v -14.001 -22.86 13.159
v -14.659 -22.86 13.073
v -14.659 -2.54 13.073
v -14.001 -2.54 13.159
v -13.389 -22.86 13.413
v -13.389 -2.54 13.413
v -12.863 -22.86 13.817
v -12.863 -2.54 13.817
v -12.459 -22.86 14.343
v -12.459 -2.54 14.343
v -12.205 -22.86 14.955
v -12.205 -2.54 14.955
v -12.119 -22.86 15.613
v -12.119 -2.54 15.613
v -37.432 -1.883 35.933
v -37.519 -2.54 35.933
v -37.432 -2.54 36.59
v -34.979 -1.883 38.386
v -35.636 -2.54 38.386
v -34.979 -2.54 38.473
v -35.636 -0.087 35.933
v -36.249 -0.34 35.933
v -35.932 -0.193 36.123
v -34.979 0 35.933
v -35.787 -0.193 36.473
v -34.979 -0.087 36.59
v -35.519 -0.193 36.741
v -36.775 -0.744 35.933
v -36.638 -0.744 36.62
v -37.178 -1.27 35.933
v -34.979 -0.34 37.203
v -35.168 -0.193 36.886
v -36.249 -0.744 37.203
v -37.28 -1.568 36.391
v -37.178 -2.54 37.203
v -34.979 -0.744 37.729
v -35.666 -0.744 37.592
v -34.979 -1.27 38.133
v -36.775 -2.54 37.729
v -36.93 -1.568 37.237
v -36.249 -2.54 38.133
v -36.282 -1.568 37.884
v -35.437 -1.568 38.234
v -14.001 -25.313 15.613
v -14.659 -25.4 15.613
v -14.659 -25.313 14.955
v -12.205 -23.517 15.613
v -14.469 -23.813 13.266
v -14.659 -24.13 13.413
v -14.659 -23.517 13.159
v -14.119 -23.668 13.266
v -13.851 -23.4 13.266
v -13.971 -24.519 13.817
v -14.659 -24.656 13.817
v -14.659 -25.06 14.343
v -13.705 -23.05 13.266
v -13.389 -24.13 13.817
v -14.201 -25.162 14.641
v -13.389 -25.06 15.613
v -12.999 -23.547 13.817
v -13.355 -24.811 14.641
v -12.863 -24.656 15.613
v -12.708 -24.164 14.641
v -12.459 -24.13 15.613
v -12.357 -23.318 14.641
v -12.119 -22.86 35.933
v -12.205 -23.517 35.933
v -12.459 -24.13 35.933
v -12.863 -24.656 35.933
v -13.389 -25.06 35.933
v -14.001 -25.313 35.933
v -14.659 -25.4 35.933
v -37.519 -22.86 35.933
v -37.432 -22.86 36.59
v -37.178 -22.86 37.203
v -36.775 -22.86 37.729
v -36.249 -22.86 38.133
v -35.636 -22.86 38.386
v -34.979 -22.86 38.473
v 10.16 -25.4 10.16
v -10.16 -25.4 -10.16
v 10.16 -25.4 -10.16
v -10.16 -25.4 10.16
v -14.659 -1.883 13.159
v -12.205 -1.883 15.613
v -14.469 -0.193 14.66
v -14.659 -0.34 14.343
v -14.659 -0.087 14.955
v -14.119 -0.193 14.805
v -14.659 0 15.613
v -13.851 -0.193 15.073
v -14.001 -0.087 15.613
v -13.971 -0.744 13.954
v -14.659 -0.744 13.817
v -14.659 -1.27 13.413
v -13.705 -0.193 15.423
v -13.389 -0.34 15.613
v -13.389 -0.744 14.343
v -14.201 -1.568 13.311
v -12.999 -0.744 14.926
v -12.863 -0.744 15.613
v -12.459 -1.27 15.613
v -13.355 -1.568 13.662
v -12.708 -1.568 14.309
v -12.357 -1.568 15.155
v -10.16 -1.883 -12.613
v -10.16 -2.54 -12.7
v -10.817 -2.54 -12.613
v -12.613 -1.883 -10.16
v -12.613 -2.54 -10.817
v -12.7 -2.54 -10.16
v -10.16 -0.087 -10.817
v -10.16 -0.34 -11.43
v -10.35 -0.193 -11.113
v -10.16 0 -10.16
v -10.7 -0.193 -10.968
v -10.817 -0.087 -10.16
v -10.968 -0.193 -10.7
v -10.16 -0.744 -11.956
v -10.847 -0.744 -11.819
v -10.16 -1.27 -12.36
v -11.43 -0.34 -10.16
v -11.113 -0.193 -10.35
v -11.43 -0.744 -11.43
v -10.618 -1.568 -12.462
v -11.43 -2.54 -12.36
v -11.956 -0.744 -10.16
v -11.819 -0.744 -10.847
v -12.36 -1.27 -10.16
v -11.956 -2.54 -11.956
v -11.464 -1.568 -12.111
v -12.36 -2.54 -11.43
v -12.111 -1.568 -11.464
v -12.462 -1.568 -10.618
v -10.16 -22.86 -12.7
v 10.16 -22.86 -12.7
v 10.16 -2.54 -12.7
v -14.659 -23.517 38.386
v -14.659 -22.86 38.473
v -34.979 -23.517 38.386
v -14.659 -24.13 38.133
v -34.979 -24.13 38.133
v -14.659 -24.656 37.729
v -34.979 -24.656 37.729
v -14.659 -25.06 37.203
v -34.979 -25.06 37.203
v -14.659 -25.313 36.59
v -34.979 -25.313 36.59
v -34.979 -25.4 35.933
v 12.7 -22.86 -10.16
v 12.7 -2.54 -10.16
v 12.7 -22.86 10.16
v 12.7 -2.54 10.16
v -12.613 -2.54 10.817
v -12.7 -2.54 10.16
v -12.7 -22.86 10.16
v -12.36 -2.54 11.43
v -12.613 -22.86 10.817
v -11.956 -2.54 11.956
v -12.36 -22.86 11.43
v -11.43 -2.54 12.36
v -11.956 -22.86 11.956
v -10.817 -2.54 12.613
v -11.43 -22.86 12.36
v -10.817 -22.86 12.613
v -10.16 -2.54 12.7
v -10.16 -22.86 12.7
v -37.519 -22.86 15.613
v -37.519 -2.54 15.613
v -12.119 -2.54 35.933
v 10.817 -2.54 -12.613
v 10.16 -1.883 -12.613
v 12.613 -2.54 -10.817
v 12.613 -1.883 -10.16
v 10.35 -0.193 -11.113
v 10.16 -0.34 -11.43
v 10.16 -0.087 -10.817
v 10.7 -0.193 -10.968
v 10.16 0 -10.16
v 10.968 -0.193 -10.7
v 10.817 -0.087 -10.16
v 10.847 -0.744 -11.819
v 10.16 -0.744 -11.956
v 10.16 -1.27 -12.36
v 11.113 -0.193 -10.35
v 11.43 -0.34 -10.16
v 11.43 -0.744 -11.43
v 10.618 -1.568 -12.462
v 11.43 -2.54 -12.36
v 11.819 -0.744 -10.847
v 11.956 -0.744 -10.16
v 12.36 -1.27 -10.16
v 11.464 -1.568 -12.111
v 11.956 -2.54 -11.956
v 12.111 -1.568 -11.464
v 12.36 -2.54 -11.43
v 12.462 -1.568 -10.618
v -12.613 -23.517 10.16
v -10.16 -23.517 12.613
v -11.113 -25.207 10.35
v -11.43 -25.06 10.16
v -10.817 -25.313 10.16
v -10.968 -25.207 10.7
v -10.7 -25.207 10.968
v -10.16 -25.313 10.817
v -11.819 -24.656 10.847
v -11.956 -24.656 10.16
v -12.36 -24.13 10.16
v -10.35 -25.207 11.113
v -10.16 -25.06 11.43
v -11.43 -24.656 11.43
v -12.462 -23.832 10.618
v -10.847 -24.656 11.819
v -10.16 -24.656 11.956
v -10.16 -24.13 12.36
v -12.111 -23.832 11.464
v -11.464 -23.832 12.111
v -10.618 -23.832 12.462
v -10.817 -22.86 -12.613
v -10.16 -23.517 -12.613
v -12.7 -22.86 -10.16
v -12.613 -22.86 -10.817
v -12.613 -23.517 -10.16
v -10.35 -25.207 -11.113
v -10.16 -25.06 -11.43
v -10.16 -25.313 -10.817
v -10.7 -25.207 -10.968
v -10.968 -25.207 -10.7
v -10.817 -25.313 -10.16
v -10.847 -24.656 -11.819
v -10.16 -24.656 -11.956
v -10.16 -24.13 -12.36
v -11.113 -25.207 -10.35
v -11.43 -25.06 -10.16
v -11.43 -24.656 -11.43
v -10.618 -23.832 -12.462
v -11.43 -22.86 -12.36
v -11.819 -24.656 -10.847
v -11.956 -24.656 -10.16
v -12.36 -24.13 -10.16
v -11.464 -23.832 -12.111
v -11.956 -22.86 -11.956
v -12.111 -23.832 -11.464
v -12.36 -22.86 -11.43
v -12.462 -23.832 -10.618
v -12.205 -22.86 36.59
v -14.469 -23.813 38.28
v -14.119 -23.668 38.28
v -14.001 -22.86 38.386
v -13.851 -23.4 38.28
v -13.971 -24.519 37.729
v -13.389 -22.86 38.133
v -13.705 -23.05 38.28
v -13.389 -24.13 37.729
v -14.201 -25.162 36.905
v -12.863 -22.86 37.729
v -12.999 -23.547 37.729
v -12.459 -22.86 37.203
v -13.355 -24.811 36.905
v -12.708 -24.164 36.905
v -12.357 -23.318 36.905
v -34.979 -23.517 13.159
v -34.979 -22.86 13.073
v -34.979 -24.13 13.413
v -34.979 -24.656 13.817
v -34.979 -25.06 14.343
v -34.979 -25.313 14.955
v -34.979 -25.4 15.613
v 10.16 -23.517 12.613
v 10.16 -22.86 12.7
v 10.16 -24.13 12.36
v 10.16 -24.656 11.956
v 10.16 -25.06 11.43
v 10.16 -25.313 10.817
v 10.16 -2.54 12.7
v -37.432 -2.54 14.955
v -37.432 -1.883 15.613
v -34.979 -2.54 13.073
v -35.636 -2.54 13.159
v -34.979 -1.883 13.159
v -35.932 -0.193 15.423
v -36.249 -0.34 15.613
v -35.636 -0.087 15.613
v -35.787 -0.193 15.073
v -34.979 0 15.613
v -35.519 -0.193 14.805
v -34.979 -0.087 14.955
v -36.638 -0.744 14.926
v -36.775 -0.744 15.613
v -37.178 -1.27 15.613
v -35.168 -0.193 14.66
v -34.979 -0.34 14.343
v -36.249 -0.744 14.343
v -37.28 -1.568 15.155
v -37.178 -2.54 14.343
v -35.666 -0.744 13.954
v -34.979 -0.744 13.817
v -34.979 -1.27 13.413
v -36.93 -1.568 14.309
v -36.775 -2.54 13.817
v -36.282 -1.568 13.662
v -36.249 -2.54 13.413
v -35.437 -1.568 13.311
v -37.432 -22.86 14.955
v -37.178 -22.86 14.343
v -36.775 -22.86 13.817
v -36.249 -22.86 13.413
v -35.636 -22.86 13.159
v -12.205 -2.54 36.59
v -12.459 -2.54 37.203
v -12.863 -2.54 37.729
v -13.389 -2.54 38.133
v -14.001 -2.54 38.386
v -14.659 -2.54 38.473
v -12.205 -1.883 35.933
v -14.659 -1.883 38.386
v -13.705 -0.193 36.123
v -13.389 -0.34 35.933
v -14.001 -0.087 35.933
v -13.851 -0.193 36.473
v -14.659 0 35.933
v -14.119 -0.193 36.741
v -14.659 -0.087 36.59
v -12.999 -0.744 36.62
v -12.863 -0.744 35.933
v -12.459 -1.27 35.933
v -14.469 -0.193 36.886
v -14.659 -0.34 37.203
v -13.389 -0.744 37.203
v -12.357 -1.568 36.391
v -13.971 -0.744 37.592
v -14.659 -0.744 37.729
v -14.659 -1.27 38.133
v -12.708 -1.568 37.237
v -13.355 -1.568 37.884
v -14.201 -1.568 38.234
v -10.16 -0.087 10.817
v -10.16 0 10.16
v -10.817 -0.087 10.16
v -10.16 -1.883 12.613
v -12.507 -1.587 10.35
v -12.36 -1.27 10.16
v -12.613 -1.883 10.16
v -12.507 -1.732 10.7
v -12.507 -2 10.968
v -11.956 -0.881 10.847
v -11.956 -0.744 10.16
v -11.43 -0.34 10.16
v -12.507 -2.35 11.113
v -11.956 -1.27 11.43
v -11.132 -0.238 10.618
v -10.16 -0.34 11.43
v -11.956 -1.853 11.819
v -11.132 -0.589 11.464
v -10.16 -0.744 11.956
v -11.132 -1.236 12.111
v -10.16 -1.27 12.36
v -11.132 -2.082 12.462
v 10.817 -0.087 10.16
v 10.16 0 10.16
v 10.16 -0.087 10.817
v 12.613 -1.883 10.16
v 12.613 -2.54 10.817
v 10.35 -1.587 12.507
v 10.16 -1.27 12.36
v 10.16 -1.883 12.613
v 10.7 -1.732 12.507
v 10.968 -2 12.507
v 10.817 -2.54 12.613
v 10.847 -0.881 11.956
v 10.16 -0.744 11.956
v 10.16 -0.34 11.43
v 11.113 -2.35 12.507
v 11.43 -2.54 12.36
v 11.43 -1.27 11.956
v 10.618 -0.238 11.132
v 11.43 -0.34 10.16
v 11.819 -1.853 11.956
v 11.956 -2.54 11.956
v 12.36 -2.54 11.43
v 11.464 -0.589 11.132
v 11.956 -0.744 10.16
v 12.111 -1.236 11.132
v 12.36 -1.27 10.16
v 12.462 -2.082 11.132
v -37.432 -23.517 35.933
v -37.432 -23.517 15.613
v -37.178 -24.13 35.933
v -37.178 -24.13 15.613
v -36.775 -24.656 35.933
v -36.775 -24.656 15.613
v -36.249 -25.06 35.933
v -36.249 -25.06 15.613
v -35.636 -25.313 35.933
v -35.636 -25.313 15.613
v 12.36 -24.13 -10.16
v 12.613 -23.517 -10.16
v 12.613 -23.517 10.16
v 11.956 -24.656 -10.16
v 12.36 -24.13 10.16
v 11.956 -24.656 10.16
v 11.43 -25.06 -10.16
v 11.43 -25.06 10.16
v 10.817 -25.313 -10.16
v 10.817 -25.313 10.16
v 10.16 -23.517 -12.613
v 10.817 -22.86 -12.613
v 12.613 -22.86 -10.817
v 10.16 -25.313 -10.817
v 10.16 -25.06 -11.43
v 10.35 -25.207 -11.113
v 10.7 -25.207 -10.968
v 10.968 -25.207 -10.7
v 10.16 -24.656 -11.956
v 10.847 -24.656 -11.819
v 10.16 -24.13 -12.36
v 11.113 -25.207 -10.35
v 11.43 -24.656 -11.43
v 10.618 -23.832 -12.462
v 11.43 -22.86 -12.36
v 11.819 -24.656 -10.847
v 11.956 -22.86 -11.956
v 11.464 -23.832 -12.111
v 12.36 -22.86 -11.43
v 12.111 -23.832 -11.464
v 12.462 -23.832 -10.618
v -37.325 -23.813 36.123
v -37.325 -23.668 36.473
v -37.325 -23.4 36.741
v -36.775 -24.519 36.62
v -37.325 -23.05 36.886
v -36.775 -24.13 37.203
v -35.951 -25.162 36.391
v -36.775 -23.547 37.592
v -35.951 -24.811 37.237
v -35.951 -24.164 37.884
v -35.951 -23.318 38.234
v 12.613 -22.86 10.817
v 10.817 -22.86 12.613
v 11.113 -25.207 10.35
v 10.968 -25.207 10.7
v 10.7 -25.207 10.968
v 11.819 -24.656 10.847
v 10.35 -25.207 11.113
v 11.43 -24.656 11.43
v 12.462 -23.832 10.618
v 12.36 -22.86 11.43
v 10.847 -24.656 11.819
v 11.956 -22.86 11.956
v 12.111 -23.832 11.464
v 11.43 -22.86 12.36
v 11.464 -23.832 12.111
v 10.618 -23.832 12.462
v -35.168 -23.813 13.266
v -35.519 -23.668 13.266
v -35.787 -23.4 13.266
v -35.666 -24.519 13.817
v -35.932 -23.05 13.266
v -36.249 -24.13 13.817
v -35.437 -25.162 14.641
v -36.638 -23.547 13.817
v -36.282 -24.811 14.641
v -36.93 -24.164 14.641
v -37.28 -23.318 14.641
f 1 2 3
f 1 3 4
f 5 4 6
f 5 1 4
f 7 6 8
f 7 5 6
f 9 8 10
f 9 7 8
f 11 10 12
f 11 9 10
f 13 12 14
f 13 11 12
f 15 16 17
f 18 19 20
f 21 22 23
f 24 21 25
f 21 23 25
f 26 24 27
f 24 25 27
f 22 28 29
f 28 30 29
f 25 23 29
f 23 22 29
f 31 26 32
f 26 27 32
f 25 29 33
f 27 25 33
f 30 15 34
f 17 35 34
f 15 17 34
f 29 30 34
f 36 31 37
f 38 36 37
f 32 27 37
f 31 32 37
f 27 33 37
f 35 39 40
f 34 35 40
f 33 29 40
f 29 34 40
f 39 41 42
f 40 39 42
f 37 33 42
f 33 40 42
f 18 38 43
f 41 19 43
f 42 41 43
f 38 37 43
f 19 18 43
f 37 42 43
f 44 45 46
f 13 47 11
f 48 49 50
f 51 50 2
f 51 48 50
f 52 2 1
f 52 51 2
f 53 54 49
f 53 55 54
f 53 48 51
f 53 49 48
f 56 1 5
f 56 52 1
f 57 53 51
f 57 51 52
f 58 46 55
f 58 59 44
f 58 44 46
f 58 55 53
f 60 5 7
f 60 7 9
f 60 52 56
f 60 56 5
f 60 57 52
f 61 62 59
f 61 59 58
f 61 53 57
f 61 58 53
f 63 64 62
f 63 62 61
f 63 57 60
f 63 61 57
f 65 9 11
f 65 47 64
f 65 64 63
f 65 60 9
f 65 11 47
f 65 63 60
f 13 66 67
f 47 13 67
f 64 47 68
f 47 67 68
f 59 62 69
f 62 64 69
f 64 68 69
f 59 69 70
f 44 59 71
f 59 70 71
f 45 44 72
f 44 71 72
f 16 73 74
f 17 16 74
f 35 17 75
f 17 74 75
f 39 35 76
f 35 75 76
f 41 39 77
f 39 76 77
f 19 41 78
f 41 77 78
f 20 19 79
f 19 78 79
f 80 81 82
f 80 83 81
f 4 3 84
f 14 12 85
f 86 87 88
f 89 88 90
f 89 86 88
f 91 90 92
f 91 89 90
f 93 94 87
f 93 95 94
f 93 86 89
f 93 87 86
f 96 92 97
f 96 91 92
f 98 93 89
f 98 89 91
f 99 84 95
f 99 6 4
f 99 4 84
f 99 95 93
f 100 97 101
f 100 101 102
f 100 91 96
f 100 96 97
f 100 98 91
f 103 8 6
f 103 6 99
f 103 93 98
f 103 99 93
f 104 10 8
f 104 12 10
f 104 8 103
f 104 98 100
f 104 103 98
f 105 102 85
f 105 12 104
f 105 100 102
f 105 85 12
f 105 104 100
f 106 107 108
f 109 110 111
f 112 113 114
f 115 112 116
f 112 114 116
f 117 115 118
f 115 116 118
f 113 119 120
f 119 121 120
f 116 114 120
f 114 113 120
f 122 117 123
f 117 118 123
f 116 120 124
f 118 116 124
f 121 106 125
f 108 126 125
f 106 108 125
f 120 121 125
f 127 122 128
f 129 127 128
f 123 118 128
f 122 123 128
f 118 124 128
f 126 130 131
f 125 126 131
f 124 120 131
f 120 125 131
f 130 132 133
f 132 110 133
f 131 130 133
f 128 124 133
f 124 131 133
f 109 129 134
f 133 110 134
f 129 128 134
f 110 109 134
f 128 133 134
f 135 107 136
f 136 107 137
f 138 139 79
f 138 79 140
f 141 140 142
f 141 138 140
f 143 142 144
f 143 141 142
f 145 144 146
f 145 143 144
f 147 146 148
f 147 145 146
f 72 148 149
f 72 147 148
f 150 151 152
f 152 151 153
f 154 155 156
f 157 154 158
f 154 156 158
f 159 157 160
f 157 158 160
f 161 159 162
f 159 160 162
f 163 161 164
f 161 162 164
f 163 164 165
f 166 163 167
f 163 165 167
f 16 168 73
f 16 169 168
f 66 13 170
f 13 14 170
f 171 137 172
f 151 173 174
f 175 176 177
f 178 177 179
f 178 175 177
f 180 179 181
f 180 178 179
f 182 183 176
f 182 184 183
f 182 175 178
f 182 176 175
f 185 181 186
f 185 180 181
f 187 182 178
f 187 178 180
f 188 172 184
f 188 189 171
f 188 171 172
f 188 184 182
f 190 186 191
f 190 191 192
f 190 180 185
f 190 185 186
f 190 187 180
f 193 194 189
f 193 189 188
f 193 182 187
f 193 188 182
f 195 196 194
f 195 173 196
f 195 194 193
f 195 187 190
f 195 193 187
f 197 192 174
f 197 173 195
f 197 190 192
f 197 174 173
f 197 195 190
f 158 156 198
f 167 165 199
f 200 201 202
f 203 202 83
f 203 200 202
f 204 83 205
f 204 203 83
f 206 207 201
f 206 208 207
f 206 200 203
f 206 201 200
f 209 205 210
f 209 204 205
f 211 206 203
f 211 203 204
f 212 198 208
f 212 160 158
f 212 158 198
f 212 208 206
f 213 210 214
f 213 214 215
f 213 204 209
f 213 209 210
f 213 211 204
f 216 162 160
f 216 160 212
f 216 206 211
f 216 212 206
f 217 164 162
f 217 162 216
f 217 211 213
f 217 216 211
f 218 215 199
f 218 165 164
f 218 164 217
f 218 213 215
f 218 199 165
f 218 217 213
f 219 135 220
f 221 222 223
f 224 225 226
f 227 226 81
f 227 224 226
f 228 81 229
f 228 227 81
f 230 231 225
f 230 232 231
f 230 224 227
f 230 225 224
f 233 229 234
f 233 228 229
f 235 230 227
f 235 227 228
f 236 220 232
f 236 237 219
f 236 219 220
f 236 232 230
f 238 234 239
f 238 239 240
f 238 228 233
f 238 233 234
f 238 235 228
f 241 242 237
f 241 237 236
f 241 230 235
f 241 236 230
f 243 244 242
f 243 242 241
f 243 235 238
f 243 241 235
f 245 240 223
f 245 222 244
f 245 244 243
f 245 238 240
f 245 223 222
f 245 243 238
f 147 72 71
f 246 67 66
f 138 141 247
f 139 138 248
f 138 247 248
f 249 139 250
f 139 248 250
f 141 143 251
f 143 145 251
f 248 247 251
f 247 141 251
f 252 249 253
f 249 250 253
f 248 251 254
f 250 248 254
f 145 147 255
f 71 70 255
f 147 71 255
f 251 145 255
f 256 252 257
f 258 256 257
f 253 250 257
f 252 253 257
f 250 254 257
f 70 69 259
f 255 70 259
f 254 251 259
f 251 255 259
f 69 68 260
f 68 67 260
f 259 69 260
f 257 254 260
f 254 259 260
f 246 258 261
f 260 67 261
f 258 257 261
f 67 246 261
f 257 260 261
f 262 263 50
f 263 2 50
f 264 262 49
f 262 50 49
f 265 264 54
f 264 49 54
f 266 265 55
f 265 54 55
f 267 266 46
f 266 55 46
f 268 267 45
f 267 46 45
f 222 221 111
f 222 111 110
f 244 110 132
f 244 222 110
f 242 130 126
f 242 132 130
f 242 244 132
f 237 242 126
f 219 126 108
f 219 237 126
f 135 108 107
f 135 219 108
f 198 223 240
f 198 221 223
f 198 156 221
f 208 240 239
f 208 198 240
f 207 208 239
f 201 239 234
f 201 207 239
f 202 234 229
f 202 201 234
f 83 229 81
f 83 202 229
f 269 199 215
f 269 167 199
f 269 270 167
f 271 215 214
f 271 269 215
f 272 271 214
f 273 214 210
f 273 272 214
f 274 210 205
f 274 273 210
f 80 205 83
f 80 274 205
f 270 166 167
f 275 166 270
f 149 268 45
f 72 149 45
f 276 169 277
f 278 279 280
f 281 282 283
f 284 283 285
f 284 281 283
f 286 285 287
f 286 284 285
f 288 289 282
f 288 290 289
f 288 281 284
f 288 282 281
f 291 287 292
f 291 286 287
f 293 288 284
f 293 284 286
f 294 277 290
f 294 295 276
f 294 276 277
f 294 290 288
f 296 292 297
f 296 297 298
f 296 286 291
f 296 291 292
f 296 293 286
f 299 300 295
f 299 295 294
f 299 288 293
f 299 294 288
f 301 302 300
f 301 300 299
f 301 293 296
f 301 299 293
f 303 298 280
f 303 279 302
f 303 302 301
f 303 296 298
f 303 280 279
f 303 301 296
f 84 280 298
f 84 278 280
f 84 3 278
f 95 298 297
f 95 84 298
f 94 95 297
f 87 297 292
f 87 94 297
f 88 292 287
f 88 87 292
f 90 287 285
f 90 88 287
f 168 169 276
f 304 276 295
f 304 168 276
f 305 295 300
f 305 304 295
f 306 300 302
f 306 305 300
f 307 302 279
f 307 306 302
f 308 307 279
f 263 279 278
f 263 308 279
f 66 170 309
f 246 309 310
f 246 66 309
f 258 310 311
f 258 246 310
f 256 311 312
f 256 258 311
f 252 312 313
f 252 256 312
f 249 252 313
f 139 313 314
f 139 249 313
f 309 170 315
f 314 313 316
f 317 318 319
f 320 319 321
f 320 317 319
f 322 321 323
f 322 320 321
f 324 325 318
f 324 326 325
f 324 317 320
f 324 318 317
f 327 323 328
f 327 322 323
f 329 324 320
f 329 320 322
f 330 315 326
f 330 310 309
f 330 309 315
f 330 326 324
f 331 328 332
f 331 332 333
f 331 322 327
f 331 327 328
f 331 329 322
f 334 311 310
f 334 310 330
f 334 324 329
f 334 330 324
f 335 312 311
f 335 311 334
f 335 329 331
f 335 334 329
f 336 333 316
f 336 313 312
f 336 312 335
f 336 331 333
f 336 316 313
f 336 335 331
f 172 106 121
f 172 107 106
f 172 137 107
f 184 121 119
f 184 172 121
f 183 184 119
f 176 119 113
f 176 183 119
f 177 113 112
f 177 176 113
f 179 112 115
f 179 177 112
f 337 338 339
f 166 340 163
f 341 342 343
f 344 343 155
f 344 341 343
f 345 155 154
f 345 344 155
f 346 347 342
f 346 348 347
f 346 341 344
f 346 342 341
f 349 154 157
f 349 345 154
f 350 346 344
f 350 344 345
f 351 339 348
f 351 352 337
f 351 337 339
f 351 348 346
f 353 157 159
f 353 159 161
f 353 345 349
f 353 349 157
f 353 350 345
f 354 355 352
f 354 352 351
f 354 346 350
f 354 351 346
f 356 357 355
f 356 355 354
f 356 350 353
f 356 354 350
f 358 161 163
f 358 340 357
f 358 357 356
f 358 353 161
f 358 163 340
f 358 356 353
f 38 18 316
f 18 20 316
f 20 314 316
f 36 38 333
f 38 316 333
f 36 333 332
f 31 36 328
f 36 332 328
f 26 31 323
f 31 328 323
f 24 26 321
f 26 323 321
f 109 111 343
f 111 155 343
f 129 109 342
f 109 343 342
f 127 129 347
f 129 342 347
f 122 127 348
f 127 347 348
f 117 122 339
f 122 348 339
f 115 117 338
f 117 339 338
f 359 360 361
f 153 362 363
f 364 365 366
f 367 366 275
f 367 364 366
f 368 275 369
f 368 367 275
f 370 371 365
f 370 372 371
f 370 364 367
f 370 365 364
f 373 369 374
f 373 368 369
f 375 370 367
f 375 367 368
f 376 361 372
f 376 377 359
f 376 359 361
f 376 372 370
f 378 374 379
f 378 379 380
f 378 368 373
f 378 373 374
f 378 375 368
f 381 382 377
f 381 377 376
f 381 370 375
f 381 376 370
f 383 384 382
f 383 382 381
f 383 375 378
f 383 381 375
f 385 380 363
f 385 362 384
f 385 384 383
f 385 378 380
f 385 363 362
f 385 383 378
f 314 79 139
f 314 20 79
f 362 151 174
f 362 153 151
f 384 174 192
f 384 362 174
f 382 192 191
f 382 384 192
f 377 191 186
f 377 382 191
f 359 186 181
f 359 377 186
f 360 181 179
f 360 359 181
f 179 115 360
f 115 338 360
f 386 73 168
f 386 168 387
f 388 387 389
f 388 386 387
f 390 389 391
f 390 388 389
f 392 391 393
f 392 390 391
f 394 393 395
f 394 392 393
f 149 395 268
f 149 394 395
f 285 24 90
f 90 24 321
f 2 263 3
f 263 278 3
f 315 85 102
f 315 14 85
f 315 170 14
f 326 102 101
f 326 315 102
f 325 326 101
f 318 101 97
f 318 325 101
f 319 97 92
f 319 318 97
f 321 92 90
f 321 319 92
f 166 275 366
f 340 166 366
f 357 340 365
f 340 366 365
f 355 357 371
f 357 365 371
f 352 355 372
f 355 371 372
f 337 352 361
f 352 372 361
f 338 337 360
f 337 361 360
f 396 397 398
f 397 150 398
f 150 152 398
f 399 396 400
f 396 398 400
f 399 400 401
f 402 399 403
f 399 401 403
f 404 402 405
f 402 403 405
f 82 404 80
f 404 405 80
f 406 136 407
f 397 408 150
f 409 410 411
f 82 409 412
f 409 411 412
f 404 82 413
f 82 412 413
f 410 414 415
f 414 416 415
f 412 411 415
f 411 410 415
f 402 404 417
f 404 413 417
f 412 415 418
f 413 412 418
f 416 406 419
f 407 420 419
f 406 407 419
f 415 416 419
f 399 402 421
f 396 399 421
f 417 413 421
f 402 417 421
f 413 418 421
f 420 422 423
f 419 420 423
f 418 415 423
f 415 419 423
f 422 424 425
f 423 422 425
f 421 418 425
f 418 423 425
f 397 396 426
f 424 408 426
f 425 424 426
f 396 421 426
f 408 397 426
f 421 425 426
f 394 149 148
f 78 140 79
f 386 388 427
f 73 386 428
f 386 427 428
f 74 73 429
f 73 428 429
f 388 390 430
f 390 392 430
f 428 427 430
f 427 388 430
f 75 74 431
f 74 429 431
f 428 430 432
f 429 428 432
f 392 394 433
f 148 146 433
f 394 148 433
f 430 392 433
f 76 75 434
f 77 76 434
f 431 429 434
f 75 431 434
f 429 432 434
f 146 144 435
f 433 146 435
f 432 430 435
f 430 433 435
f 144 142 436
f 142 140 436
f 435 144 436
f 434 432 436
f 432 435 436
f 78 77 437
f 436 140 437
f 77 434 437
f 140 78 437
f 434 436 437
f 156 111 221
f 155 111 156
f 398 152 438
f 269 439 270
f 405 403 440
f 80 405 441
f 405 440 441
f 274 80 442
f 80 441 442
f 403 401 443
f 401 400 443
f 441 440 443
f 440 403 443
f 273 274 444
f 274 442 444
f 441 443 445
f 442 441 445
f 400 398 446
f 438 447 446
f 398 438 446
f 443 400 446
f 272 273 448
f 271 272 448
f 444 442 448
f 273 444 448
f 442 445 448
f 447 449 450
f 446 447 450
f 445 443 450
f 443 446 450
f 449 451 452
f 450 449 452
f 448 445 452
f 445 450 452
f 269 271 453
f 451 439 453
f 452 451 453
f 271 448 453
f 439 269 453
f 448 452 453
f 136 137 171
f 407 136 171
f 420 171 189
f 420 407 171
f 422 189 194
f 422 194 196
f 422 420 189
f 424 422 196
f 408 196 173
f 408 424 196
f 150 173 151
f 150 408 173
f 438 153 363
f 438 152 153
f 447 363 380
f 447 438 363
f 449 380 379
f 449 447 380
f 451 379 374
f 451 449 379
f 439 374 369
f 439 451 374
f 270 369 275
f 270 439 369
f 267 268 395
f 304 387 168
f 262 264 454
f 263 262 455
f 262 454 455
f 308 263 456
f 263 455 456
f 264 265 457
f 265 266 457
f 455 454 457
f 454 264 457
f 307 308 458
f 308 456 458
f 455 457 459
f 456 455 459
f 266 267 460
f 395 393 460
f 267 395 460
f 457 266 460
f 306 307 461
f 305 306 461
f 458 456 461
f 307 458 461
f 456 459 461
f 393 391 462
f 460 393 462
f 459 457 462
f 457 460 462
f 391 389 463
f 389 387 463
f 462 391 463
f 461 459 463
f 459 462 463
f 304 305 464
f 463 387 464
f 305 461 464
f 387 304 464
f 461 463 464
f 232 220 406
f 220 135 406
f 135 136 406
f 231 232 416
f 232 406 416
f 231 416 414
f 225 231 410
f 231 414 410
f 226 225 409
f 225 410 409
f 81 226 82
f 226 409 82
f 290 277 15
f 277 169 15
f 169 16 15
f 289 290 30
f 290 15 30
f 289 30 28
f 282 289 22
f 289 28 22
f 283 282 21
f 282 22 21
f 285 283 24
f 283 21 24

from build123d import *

# Parameters (mm, degrees)
F0_W     = 25.4
F0_H     = 25.4
F1_DEPTH = 25.4
F2_R     = 2.54
F3_W     = 25.4
F3_H     = 25.4
F4_DEPTH = 25.4
F5_R     = 2.54


with BuildPart() as f1:
    # F0 (on Front) → F1 (new body)
    with BuildSketch(Plane.XZ):
        Rectangle(F0_W, F0_H)
    extrude(amount=F1_DEPTH)

    # F2
    f2_edges = [f1.edges().sort_by_distance(p)[0] for p in [
        (-12.7, -12.7, -12.7),
        (12.7, -12.7, -12.7),
        (0, 0, -12.7),
        (0, -25.4, -12.7),
        (12.7, 0, 0),
        (0, 0, 12.7),
        (-12.7, 0, 0),
        (12.7, -12.7, 12.7),
        (12.7, -25.4, 0),
        (-12.7, -12.7, 12.7),
        (-12.7, -25.4, 0),
        (0, -25.4, 12.7),
    ]]
    fillet(f2_edges, radius=F2_R)


with BuildPart() as f4:
    # F3 (on Front) → F4 (new body)
    with BuildSketch(Plane.XZ):
        with Locations((-24.818721, 25.772888)):
            Rectangle(F3_W, F3_H)
    extrude(amount=F4_DEPTH)

    # F5
    f5_edges = [f4.edges().sort_by_distance(p)[0] for p in [
        (-12.118721, -25.4, 25.772888),
        (-24.818721, -25.4, 38.472888),
        (-37.518721, -25.4, 25.772888),
        (-24.818721, -25.4, 13.072888),
        (-37.518721, -12.7, 38.472888),
        (-37.518721, -12.7, 13.072888),
        (-37.518721, 0, 25.772888),
        (-12.118721, -12.7, 13.072888),
        (-24.818721, 0, 13.072888),
        (-12.118721, -12.7, 38.472888),
        (-12.118721, 0, 25.772888),
        (-24.818721, 0, 38.472888),
    ]]
    fillet(f5_edges, radius=F5_R)


solid = Compound([f1.part, f4.part])
